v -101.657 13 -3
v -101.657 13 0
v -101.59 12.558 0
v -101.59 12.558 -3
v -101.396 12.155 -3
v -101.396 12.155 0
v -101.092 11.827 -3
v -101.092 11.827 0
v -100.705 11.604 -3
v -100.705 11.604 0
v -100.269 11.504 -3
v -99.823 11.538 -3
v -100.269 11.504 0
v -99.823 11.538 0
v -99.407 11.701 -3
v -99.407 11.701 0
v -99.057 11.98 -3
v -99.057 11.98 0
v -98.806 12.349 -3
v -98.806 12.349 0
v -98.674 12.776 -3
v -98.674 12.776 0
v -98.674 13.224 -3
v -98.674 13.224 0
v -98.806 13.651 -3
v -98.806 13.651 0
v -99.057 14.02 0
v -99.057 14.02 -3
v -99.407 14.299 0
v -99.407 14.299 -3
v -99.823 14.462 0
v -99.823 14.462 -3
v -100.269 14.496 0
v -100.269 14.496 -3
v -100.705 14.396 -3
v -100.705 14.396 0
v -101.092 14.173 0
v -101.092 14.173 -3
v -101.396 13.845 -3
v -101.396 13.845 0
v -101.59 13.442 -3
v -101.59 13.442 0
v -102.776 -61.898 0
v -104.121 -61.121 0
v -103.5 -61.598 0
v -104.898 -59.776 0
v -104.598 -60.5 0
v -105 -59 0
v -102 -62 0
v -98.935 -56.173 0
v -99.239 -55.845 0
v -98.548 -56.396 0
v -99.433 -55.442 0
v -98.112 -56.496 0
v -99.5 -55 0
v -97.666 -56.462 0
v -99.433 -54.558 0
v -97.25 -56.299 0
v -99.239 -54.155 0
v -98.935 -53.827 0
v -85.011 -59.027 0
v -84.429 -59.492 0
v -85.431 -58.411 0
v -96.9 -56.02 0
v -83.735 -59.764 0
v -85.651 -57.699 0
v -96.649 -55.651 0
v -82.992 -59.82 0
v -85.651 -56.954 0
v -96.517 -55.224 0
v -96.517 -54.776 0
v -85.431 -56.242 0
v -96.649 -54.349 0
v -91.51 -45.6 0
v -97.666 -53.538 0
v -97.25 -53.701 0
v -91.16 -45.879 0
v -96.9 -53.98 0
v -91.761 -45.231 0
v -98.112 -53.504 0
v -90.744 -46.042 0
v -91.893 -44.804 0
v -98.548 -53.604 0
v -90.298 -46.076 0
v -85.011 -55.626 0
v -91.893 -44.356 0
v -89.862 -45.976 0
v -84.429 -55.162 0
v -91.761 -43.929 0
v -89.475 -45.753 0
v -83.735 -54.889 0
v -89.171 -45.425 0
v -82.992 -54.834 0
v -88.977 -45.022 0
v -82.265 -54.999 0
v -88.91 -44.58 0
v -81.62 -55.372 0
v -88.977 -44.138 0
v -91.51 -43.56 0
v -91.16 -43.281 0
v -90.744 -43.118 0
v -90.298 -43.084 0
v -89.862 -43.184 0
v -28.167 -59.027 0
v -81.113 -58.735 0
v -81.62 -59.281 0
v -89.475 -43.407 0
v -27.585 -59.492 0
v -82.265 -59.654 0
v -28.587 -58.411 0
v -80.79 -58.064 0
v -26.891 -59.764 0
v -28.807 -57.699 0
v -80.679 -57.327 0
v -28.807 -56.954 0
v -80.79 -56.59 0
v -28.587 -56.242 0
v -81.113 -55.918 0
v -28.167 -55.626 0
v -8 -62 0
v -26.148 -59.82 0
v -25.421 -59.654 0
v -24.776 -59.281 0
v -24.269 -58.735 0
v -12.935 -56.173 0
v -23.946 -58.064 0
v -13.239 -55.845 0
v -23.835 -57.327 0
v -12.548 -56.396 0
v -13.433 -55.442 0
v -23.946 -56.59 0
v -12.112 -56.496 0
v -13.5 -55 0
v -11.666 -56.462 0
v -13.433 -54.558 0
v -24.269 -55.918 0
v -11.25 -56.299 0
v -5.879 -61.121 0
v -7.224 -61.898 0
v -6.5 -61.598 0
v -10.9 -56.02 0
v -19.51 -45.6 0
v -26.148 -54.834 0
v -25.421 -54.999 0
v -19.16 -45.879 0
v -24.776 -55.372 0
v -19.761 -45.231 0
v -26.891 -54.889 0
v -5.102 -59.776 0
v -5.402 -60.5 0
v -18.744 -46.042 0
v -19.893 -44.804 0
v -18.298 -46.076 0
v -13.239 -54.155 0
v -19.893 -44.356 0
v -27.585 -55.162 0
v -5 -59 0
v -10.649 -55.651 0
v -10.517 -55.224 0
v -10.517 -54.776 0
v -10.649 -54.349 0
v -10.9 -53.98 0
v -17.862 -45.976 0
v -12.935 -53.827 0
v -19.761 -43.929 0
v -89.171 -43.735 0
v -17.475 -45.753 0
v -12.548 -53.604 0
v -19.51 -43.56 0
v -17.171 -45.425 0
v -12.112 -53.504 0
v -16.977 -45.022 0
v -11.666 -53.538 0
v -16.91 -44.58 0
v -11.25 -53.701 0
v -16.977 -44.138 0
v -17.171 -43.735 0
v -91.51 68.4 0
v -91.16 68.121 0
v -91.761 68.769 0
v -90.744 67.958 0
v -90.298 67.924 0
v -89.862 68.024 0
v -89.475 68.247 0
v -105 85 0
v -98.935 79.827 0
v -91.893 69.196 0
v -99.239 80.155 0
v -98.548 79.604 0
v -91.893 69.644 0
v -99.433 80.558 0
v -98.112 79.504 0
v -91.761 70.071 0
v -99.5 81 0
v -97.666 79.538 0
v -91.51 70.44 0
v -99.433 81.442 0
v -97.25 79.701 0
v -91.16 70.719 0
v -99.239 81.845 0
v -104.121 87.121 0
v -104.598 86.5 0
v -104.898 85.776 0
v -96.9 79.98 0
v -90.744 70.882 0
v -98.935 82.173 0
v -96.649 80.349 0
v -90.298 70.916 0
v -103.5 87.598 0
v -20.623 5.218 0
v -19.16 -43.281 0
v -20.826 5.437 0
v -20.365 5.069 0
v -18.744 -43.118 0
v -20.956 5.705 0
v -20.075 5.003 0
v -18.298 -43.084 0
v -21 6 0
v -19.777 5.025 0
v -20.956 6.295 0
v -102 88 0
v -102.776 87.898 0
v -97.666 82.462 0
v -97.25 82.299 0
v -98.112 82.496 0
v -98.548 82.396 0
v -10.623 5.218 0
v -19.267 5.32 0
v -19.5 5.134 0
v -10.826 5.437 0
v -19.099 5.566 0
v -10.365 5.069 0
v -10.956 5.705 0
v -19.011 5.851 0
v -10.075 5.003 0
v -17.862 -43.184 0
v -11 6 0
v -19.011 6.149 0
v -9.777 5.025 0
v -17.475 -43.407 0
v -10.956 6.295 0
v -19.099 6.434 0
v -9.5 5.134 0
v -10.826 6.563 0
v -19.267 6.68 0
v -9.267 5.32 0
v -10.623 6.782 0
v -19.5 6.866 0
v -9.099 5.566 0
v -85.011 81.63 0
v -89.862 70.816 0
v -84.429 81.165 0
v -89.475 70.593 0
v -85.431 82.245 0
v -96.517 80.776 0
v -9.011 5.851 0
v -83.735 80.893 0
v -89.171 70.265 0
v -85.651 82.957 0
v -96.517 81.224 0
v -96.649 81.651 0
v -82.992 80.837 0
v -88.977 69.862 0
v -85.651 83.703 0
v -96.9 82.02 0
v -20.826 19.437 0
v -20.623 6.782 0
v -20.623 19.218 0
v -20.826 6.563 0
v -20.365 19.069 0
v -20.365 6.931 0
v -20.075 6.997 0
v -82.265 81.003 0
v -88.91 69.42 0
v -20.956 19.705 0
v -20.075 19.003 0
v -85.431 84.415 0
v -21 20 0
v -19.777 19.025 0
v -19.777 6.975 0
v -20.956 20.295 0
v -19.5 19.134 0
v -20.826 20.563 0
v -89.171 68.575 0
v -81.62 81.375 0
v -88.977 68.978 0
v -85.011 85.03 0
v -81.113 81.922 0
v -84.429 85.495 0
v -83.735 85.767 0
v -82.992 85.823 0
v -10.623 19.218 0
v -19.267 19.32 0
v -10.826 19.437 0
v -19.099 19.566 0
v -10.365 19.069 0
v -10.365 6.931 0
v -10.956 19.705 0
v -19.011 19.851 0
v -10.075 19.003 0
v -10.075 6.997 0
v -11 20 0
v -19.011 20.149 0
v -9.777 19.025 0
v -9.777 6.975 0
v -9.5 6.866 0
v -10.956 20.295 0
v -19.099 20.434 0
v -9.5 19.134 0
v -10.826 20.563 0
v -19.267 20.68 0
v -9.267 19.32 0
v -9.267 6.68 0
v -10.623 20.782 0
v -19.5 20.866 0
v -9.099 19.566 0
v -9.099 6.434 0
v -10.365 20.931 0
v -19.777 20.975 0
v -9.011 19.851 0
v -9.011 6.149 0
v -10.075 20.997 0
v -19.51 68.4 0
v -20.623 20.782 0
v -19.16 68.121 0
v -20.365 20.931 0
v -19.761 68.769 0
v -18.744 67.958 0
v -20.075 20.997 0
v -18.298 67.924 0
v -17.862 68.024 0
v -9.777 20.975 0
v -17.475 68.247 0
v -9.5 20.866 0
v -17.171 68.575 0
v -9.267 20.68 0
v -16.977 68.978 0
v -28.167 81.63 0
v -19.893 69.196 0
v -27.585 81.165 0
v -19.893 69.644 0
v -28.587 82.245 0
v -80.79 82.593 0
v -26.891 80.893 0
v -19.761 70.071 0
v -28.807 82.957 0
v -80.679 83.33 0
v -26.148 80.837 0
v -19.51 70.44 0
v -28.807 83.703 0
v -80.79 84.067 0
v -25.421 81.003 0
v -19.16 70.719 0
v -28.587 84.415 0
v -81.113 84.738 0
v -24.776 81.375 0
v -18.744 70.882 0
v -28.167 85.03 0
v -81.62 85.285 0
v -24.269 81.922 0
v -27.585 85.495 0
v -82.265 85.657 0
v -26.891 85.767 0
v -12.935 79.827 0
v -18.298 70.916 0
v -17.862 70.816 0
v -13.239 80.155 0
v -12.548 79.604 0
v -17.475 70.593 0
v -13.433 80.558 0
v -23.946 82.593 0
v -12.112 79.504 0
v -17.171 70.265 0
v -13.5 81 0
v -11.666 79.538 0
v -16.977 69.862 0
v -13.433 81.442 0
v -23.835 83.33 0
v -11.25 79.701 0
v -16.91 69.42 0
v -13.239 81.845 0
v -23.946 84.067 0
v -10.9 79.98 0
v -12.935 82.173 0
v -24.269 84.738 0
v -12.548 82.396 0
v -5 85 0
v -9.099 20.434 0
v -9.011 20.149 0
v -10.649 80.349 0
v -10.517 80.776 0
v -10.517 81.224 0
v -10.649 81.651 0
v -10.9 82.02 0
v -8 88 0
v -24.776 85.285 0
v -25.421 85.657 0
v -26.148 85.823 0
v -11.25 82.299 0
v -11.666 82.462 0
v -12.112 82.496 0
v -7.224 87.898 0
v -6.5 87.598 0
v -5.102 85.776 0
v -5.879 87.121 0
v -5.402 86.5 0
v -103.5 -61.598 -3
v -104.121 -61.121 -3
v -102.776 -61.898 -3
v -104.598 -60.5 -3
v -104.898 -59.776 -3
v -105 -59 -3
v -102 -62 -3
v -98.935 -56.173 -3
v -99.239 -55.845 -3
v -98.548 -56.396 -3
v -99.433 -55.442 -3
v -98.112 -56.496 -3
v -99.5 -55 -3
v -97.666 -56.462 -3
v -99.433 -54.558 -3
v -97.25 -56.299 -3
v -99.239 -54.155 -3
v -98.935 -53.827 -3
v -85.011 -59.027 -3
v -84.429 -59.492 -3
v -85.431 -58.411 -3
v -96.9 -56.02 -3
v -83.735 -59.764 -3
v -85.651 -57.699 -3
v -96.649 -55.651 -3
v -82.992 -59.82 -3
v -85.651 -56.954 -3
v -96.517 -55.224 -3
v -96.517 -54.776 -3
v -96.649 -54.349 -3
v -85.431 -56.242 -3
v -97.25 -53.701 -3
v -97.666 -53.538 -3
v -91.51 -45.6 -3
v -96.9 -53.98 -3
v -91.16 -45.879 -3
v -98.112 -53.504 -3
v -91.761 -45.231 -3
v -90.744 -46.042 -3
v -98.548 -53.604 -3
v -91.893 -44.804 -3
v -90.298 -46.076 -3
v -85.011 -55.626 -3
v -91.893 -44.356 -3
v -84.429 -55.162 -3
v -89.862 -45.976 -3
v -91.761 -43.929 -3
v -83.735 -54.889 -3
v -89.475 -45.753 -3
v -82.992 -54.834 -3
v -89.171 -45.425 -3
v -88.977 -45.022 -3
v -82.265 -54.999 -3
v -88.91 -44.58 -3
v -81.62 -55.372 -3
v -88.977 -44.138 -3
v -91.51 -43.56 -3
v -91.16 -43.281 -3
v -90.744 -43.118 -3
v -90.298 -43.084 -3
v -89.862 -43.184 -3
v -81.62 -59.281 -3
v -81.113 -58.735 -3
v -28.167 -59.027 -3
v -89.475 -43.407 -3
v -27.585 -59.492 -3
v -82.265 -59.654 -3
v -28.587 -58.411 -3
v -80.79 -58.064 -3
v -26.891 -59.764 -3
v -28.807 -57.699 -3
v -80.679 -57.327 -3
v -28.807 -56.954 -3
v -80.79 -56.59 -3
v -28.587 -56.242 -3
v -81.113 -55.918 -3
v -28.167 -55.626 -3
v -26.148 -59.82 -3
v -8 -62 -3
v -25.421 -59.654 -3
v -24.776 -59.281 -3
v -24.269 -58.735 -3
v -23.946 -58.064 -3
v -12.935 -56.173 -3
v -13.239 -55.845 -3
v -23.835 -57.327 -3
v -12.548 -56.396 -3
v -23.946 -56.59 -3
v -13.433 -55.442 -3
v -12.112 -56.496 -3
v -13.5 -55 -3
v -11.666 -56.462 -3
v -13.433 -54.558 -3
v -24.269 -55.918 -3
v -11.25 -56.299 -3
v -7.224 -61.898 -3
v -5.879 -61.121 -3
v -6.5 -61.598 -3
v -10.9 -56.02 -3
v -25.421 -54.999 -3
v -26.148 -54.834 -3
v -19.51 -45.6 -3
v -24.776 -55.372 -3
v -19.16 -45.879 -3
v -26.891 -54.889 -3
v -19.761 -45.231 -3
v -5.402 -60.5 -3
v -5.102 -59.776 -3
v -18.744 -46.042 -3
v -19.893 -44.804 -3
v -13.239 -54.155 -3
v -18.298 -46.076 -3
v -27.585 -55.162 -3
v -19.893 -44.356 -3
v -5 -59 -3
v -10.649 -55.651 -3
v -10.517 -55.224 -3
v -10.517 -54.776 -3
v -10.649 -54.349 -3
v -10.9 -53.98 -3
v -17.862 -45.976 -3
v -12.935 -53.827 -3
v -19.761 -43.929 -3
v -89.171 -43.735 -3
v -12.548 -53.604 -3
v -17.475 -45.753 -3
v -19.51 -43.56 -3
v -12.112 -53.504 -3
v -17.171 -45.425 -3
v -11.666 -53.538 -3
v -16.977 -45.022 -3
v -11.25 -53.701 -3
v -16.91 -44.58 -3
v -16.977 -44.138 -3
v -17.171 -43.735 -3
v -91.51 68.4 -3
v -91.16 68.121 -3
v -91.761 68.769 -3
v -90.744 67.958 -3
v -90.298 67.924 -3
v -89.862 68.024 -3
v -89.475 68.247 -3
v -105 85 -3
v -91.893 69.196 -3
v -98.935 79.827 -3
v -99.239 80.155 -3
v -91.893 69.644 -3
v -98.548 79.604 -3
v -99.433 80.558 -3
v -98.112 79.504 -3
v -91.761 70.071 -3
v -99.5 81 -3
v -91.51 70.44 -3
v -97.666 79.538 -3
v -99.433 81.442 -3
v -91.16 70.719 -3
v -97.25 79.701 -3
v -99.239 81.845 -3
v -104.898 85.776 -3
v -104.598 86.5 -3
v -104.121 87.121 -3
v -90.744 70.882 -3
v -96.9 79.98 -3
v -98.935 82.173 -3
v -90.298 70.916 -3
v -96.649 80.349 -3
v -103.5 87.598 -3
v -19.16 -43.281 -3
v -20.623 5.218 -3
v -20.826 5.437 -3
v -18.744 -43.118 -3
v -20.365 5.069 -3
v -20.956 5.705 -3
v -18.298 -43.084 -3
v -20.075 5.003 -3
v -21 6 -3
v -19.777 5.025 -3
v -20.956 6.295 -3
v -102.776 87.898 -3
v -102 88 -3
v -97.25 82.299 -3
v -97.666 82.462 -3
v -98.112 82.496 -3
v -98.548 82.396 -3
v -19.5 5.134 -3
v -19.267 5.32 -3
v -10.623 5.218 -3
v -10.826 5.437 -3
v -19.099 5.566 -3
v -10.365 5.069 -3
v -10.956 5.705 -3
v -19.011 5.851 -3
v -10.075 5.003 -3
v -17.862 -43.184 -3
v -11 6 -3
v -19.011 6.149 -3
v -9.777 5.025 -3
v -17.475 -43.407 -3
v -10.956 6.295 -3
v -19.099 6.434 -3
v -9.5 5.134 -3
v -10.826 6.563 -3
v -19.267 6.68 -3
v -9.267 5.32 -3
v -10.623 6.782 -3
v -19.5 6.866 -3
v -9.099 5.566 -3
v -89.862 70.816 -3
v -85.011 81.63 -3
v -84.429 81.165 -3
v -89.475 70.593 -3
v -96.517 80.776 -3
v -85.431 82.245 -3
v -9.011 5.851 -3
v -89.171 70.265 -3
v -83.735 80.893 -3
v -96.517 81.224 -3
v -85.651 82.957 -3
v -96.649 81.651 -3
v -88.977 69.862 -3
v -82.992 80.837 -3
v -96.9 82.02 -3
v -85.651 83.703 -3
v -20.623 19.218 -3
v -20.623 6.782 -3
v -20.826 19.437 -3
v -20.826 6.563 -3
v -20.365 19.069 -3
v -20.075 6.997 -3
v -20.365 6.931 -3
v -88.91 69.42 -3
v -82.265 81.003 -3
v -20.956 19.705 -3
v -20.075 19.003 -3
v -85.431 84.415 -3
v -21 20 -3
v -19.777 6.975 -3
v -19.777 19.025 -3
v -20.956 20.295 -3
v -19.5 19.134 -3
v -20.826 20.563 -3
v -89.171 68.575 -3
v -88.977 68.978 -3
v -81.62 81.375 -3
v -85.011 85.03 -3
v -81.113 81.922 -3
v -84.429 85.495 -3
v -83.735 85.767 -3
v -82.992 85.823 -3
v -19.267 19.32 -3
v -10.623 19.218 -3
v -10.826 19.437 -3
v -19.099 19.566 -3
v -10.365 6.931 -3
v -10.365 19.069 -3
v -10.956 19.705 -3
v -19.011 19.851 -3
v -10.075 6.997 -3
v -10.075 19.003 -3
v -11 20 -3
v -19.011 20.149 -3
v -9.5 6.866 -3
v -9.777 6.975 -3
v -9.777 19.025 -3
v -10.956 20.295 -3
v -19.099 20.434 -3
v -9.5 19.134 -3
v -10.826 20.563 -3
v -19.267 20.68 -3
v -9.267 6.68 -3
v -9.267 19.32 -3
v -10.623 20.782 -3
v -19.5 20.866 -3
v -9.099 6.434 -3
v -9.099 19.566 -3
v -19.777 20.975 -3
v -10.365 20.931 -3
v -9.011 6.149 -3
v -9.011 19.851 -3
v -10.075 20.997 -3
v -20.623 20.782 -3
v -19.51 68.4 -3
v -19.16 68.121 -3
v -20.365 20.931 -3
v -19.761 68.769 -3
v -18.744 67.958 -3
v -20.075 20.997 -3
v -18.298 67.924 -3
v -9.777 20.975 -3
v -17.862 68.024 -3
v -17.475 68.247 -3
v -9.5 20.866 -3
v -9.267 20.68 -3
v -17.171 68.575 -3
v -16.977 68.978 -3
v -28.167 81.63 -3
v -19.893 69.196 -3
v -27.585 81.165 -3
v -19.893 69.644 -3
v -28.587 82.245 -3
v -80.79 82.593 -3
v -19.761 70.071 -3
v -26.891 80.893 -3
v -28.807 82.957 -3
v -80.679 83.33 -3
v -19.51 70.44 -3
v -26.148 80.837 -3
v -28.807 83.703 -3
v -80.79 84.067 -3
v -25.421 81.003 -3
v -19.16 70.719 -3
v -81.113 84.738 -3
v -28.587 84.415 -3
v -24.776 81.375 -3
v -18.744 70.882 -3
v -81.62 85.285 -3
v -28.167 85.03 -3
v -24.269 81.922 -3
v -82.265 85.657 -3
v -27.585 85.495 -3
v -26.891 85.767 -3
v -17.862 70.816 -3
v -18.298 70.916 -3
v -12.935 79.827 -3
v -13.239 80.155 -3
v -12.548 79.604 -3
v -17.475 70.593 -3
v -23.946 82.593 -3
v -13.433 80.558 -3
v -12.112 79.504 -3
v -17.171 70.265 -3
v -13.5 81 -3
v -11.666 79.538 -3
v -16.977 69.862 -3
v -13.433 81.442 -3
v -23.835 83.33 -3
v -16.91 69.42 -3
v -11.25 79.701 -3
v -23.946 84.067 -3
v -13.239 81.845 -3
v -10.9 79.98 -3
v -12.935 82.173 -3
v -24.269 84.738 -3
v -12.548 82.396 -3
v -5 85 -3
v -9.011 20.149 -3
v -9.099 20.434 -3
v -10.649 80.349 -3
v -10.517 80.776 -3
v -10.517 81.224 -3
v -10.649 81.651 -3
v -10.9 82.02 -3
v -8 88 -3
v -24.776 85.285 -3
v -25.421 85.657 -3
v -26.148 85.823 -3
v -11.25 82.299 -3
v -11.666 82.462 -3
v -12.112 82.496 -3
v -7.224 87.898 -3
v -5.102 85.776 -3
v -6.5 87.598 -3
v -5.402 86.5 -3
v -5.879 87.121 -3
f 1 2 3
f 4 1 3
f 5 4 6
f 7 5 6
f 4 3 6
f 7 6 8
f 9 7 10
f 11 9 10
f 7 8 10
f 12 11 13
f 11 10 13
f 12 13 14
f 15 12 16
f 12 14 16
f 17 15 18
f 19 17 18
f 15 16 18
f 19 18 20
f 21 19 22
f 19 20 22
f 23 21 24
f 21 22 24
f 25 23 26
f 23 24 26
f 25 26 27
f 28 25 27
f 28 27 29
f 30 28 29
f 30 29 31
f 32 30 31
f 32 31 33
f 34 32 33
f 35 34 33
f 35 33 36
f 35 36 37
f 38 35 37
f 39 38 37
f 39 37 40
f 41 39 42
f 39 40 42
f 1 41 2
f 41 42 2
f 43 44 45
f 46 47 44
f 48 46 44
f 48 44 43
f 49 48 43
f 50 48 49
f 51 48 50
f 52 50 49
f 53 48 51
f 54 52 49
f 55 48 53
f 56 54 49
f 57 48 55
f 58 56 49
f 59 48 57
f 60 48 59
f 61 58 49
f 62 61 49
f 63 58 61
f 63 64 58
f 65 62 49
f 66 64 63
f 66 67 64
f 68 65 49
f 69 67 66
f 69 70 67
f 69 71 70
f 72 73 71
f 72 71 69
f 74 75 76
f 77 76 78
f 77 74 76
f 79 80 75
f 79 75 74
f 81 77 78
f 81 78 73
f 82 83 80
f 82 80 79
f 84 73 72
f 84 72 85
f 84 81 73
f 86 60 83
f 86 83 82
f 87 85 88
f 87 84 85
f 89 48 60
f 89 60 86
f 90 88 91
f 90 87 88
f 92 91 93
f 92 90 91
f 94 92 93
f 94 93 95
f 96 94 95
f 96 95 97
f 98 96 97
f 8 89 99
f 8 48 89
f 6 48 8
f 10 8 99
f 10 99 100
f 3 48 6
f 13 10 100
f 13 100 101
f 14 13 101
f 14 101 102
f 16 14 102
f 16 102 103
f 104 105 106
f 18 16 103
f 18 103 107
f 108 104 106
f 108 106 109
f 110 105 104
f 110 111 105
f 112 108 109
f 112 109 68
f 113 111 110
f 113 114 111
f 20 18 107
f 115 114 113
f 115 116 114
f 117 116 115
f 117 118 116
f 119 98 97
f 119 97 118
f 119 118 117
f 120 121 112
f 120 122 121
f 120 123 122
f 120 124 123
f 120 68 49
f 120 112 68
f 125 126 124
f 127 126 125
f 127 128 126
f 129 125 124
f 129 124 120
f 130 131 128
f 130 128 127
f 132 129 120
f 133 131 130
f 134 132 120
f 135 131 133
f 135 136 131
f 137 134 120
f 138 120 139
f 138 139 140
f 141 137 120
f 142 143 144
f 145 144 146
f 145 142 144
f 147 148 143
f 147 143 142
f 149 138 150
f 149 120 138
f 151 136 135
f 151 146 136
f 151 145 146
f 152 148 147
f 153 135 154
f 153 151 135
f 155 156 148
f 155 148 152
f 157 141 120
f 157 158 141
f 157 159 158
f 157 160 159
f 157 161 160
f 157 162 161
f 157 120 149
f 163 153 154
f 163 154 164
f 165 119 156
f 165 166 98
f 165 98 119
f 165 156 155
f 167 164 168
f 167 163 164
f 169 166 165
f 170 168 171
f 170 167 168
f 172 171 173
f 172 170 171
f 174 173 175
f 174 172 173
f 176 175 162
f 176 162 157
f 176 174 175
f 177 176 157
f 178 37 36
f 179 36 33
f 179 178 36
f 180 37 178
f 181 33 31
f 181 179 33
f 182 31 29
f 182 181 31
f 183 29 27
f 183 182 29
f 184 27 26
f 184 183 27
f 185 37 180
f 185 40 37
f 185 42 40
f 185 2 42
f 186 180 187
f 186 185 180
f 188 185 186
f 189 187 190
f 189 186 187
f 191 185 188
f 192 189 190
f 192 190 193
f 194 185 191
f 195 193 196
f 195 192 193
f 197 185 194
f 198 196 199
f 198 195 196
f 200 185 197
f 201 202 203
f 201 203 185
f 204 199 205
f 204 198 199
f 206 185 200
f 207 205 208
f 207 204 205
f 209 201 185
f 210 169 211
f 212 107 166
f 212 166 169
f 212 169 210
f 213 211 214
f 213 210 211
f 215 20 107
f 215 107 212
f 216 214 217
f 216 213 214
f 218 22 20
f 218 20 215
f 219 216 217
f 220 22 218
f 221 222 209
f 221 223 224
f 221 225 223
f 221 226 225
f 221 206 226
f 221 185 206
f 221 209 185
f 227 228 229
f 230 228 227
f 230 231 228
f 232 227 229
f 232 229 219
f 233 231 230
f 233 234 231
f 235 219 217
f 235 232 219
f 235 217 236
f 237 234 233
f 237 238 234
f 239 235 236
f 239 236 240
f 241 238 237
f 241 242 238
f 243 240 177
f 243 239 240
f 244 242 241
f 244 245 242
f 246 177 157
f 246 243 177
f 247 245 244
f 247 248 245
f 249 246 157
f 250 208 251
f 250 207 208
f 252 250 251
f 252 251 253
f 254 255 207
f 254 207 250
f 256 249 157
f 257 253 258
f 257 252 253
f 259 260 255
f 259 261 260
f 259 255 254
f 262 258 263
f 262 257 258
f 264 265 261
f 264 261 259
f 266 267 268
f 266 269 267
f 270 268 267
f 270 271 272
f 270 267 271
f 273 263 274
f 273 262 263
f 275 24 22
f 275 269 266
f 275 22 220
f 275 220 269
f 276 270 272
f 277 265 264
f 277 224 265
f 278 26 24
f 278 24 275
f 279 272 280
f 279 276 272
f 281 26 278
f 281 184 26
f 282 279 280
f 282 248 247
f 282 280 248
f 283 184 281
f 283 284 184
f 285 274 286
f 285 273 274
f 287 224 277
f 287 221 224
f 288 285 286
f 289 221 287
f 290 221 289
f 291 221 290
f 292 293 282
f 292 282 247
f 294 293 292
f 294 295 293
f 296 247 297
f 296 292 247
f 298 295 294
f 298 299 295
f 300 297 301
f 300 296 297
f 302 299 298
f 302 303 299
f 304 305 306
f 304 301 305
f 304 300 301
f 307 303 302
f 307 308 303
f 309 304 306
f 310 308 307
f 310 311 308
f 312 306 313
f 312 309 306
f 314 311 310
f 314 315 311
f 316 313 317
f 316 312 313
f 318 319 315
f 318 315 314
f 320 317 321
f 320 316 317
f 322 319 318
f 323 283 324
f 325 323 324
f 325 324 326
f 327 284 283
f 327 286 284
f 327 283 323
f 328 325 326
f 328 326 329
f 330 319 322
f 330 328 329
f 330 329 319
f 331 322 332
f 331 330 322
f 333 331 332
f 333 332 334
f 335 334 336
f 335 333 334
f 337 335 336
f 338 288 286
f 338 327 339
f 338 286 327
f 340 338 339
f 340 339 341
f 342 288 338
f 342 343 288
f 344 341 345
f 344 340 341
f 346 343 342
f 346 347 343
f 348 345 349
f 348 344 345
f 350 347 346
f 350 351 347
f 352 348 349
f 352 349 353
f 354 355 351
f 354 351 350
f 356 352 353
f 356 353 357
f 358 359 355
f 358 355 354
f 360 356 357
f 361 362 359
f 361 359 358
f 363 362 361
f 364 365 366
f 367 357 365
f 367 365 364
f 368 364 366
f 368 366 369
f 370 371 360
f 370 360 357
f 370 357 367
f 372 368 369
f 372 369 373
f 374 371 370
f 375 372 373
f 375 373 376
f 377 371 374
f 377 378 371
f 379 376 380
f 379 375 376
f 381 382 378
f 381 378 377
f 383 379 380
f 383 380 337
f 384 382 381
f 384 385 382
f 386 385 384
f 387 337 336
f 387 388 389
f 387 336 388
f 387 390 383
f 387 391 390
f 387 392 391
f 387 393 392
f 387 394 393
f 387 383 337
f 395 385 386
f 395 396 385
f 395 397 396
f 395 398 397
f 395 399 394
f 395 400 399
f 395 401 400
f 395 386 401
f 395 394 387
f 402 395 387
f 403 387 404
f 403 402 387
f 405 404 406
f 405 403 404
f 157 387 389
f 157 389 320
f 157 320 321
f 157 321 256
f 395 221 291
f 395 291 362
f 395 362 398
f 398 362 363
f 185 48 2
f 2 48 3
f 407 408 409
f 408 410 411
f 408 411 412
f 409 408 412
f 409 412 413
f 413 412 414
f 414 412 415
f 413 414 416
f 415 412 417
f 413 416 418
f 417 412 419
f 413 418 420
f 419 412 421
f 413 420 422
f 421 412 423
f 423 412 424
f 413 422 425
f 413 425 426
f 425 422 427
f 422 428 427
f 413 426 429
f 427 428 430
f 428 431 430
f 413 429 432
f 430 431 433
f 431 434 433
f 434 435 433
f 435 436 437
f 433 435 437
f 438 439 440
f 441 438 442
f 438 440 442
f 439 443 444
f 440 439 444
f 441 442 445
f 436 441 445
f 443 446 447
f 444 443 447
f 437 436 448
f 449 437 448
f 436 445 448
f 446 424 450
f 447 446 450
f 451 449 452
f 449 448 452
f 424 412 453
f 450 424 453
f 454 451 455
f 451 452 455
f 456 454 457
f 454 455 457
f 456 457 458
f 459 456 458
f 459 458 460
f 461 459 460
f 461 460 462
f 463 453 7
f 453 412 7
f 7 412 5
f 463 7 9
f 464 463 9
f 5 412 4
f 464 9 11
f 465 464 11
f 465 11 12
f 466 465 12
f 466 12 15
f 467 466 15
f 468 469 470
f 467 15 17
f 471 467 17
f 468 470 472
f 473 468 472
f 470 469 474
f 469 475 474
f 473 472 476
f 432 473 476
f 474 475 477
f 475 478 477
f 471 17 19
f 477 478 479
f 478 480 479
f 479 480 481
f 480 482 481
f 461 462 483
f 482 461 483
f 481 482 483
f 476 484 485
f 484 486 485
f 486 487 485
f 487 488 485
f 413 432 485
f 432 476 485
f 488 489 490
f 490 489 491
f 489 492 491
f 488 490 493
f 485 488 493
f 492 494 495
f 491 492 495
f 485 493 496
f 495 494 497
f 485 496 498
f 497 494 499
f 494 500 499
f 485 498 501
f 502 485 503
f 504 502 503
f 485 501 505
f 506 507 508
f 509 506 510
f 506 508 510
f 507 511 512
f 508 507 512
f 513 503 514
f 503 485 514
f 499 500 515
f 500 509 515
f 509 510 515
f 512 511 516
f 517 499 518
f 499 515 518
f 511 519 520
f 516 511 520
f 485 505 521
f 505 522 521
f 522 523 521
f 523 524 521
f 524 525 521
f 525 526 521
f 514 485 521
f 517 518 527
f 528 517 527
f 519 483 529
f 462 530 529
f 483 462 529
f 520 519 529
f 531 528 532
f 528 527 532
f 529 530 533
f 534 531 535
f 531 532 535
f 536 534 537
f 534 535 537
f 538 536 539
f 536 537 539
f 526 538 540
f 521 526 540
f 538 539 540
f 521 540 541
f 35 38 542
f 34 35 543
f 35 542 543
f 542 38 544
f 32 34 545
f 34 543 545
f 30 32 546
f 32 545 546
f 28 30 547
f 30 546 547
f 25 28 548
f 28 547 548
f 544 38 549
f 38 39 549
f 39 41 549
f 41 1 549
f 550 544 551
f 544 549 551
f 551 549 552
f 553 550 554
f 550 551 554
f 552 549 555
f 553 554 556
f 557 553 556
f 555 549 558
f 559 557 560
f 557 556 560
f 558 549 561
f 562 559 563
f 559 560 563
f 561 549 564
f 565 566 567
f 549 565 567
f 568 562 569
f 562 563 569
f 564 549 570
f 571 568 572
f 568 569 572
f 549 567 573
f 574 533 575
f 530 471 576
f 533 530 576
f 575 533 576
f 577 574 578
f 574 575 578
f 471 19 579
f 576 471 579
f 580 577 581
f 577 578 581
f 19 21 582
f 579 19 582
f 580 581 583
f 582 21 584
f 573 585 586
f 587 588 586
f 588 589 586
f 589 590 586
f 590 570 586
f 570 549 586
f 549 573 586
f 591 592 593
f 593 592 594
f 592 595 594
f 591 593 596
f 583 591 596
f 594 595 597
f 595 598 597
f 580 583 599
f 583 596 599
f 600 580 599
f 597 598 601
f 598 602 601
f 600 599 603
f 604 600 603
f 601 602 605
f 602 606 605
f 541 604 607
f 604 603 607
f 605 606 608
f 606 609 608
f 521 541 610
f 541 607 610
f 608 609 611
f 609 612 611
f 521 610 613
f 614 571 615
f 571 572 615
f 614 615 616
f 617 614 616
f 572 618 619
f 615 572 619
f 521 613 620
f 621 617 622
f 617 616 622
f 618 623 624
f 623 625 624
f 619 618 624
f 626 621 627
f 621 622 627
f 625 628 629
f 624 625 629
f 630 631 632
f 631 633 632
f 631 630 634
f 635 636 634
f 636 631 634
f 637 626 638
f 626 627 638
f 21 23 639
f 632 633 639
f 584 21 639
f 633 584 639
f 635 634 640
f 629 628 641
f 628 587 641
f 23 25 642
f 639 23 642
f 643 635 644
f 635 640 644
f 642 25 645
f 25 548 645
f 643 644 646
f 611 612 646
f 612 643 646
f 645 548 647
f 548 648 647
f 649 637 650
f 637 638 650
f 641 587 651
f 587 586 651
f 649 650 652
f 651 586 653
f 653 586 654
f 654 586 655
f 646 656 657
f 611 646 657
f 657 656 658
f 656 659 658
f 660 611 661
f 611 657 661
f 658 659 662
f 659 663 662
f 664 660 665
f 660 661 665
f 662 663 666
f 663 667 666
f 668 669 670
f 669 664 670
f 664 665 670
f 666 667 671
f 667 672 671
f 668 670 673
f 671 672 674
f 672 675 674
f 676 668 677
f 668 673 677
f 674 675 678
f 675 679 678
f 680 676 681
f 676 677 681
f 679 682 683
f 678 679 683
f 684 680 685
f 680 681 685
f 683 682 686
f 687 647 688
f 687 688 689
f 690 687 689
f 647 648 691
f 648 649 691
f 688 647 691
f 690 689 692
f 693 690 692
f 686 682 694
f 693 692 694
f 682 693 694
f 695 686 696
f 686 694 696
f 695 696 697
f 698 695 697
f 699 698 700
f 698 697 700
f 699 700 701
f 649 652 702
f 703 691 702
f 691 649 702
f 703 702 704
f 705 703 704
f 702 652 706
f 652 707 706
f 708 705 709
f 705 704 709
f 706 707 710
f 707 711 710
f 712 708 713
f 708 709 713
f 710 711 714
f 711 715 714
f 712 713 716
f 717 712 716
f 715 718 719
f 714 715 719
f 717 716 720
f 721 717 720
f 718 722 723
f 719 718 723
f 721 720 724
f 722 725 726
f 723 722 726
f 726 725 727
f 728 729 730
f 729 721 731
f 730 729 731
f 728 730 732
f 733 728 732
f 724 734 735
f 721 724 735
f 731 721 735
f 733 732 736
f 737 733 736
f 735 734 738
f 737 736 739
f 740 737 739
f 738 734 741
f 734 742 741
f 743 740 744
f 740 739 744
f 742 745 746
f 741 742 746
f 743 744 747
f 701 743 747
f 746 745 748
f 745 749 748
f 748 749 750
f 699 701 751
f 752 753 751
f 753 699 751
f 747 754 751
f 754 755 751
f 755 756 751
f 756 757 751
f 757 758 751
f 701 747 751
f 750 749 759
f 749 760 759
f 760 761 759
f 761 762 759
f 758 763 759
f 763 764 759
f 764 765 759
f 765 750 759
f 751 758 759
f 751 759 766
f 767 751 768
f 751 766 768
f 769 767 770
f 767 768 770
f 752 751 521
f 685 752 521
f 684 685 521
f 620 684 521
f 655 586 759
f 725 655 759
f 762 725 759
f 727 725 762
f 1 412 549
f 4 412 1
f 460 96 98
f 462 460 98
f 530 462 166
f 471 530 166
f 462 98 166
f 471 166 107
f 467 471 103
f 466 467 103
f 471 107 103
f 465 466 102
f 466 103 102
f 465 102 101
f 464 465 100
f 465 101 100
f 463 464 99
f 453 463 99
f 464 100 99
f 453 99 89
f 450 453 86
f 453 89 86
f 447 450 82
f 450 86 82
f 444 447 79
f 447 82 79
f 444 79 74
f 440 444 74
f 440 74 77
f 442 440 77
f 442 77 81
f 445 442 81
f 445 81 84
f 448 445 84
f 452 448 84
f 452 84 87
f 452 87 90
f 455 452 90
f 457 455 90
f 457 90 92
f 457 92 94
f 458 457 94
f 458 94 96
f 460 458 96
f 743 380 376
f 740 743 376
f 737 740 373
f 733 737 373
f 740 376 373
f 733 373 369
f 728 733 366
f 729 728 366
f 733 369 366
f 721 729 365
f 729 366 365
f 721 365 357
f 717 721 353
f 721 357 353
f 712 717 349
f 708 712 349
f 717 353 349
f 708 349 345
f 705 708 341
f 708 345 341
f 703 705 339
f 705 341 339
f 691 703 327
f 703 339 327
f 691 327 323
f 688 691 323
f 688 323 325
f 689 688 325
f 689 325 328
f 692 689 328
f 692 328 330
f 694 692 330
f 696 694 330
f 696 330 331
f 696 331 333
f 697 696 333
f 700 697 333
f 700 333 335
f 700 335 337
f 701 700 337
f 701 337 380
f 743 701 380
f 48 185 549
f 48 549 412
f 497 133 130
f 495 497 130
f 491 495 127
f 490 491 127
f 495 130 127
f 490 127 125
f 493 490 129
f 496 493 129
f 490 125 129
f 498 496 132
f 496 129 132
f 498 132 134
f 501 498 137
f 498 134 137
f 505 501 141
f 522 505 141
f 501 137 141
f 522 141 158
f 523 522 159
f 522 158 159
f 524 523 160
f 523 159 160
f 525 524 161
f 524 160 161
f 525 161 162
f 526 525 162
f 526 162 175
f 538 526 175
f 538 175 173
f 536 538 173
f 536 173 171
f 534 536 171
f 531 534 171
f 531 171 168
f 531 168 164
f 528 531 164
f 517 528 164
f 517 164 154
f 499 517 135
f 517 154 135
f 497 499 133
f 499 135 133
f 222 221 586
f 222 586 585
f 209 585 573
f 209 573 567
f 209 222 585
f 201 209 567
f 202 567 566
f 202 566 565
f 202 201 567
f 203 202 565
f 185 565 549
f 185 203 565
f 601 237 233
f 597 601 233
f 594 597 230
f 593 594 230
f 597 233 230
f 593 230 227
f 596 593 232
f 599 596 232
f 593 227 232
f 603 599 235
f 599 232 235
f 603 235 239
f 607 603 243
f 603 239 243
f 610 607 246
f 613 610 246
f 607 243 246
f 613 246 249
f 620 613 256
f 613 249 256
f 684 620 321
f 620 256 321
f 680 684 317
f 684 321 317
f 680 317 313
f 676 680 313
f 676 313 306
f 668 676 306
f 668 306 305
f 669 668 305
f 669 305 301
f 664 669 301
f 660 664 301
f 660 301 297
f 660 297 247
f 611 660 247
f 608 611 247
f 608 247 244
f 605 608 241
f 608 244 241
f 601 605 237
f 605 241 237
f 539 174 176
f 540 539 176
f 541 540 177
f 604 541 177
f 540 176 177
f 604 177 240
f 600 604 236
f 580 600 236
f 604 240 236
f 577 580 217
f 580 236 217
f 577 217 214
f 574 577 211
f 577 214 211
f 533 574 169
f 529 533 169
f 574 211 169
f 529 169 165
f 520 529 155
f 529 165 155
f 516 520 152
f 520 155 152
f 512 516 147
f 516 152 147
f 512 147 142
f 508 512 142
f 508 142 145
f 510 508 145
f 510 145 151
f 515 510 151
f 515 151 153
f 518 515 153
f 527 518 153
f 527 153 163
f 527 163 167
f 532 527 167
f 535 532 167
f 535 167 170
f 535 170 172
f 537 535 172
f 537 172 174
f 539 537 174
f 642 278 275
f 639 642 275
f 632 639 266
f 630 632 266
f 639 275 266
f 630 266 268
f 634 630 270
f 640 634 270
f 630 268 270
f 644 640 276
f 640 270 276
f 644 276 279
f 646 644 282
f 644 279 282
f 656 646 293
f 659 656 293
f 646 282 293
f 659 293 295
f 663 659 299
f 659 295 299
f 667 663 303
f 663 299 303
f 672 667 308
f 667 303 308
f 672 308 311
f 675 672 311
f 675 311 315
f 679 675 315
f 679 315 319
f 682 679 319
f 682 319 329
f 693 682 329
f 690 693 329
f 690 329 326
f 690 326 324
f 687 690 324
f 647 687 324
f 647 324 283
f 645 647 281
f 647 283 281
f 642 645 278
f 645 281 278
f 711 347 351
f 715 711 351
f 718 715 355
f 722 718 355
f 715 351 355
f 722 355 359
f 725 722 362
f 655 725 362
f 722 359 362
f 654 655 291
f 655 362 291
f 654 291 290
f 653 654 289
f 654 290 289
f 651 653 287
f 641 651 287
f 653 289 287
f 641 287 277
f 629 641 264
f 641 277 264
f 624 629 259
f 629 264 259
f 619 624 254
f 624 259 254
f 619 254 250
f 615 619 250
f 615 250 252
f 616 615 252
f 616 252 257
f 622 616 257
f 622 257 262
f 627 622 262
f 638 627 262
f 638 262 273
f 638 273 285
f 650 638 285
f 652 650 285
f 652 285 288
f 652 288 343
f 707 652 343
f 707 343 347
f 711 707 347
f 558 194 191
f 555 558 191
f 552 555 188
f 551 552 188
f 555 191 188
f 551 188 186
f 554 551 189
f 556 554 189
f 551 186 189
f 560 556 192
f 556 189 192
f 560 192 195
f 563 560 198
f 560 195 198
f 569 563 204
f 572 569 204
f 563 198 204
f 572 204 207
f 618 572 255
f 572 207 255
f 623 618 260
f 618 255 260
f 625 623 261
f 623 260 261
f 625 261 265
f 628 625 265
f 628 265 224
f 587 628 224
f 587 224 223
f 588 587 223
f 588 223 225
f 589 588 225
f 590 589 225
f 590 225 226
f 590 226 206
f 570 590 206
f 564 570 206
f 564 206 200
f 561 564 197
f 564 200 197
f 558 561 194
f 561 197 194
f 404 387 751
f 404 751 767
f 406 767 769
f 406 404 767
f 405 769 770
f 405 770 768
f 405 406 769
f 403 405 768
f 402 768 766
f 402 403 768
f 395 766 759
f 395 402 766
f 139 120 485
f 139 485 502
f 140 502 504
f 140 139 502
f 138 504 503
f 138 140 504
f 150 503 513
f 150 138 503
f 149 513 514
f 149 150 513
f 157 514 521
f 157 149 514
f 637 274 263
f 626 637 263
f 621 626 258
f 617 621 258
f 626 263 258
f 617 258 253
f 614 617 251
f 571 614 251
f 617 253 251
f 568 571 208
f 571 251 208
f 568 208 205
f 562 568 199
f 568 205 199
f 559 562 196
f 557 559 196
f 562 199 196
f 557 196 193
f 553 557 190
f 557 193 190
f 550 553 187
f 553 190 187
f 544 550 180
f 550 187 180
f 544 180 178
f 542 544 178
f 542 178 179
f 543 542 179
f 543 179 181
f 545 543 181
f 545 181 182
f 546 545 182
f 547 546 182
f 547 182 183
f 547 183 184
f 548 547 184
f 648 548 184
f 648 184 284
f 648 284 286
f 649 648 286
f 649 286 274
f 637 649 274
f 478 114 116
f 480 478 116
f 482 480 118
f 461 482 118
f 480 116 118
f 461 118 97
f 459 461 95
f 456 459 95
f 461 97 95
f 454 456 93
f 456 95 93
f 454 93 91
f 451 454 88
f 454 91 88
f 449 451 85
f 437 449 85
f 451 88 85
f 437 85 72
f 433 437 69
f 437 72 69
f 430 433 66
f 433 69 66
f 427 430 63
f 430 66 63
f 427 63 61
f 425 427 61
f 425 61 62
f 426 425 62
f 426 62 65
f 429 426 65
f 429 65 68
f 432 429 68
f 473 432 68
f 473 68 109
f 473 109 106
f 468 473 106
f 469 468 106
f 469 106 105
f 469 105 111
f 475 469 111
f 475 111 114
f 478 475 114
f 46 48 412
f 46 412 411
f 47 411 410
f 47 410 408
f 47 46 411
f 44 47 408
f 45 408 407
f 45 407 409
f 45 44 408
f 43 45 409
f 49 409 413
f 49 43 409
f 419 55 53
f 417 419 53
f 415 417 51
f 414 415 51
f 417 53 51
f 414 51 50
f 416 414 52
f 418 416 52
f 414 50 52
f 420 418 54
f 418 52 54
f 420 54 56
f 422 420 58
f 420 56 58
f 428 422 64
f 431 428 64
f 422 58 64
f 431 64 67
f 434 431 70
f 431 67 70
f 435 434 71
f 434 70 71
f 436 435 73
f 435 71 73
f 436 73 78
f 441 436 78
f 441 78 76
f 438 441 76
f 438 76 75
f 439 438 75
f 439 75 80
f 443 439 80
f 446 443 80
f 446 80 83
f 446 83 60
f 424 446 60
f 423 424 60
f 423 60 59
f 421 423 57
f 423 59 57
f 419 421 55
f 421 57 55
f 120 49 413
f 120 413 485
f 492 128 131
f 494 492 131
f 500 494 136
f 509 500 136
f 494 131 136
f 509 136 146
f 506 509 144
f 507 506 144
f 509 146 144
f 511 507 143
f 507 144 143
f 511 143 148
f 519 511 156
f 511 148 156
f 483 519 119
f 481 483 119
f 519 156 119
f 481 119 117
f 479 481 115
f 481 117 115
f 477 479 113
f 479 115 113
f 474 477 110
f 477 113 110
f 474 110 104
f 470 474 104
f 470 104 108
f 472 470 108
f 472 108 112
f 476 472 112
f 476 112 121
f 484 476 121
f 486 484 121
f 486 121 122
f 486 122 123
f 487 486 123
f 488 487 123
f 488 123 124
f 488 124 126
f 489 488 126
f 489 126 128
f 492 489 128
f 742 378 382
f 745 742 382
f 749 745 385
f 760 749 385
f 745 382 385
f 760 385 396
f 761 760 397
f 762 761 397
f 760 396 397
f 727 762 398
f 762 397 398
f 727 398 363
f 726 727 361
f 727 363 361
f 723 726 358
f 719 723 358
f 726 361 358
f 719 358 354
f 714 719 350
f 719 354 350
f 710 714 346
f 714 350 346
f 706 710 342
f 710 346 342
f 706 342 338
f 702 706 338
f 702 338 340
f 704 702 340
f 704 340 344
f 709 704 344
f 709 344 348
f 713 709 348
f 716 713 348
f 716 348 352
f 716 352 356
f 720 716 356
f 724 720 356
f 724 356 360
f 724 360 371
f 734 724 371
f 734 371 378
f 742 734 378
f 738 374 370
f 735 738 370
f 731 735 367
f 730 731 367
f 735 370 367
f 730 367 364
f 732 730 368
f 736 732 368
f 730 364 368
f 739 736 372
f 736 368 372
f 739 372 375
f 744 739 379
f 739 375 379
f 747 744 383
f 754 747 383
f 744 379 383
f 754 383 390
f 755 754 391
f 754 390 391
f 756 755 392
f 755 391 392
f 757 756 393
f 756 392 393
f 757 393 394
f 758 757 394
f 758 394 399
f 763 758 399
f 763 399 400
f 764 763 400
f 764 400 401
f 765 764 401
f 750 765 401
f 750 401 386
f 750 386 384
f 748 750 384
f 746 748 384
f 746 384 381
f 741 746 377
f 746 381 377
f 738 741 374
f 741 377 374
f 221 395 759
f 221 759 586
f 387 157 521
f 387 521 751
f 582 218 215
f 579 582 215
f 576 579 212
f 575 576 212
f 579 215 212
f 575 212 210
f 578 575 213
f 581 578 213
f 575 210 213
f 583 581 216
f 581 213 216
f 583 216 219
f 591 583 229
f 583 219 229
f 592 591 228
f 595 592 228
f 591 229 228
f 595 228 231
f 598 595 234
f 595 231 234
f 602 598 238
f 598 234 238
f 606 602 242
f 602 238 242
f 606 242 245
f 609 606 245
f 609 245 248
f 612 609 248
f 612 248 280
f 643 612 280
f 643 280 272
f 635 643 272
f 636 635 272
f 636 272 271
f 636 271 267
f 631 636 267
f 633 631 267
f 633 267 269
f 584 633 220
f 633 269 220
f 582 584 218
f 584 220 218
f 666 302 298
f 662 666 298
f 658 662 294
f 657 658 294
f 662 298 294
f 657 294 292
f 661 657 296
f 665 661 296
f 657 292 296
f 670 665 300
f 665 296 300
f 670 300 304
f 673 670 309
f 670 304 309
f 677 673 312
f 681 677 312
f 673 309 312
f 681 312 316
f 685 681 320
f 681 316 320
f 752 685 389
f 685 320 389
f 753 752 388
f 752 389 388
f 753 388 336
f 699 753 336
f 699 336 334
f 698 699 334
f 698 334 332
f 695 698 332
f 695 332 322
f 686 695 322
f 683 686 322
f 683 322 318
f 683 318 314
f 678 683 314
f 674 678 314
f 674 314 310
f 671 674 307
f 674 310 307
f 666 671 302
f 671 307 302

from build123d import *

# Parameters (mm, degrees)
SKETCH_1_R          = 1.5
SKETCH_1_R_2        = 1
EXTRUDE_1_DEPTH     = 3
SKETCH_2_R          = 1.5
CUT_EXTRUDE_2_DEPTH = 10
SKETCH_2_6_R        = 2.5
CUT_EXTRUDE_3_DEPTH = 10
SKETCH_2_7_R        = 2.5
CUT_EXTRUDE_4_DEPTH = 10


with BuildPart() as part:
    # 草图1 → 凸台-拉伸1 (new body)
    with BuildSketch(Plane.XY):
        with BuildLine():
            Line((-102, -62), (-8, -62))
            ThreePointArc((-8, -62), (-5.878679656, -61.121320344), (-5, -59))
            Line((-5, -59), (-5, 85))
            ThreePointArc((-5, 85), (-5.878679656, 87.121320344), (-8, 88))
            Line((-8, 88), (-102, 88))
            ThreePointArc((-102, 88), (-104.121320344, 87.121320344), (-105, 85))
            Line((-105, 85), (-105, -59))
            ThreePointArc((-105, -59), (-104.121320344, -61.121320344), (-102, -62))
        make_face()
        with Locations((-100.157022476, 13)):
            Circle(SKETCH_1_R, mode=Mode.SUBTRACT)
        with Locations((-12, 81)):
            Circle(SKETCH_1_R, mode=Mode.SUBTRACT)
        with Locations((-98, -55)):
            Circle(SKETCH_1_R, mode=Mode.SUBTRACT)
        with Locations((-98, 81)):
            Circle(SKETCH_1_R, mode=Mode.SUBTRACT)
        with Locations((-12, -55)):
            Circle(SKETCH_1_R, mode=Mode.SUBTRACT)
        with Locations((-10, 6)):
            Circle(SKETCH_1_R_2, mode=Mode.SUBTRACT)
        with Locations((-20, 20)):
            Circle(SKETCH_1_R_2, mode=Mode.SUBTRACT)
        with Locations((-20, 6)):
            Circle(SKETCH_1_R_2, mode=Mode.SUBTRACT)
        with Locations((-10, 20)):
            Circle(SKETCH_1_R_2, mode=Mode.SUBTRACT)
    extrude(amount=-EXTRUDE_1_DEPTH)

    # 草图2 → 切除-拉伸2 (cut)
    with BuildSketch(Plane.XY):
        with Locations((-90.41, 69.42)):
            Circle(SKETCH_2_R)
        with Locations((-18.41, 69.42)):
            Circle(SKETCH_2_R)
        with Locations((-90.41, -44.58)):
            Circle(SKETCH_2_R)
        with Locations((-18.41, -44.58)):
            Circle(SKETCH_2_R)
    extrude(amount=-CUT_EXTRUDE_2_DEPTH, mode=Mode.SUBTRACT)

    # 草图2<6> → 切除-拉伸3 (cut)
    with BuildSketch(Plane.XY):
        with Locations((-83.178616271, -57.326639146)):
            Circle(SKETCH_2_6_R)
        with Locations((-26.33472009, -57.326639146)):
            Circle(SKETCH_2_6_R)
    extrude(amount=-CUT_EXTRUDE_3_DEPTH, mode=Mode.SUBTRACT)

    # 草图2<7> → 切除-拉伸4 (cut)
    with BuildSketch(Plane.XY):
        with Locations((-83.178616271, 83.33)):
            Circle(SKETCH_2_7_R)
        with Locations((-26.33472009, 83.33)):
            Circle(SKETCH_2_7_R)
    extrude(amount=-CUT_EXTRUDE_4_DEPTH, mode=Mode.SUBTRACT)


solid = part.part
